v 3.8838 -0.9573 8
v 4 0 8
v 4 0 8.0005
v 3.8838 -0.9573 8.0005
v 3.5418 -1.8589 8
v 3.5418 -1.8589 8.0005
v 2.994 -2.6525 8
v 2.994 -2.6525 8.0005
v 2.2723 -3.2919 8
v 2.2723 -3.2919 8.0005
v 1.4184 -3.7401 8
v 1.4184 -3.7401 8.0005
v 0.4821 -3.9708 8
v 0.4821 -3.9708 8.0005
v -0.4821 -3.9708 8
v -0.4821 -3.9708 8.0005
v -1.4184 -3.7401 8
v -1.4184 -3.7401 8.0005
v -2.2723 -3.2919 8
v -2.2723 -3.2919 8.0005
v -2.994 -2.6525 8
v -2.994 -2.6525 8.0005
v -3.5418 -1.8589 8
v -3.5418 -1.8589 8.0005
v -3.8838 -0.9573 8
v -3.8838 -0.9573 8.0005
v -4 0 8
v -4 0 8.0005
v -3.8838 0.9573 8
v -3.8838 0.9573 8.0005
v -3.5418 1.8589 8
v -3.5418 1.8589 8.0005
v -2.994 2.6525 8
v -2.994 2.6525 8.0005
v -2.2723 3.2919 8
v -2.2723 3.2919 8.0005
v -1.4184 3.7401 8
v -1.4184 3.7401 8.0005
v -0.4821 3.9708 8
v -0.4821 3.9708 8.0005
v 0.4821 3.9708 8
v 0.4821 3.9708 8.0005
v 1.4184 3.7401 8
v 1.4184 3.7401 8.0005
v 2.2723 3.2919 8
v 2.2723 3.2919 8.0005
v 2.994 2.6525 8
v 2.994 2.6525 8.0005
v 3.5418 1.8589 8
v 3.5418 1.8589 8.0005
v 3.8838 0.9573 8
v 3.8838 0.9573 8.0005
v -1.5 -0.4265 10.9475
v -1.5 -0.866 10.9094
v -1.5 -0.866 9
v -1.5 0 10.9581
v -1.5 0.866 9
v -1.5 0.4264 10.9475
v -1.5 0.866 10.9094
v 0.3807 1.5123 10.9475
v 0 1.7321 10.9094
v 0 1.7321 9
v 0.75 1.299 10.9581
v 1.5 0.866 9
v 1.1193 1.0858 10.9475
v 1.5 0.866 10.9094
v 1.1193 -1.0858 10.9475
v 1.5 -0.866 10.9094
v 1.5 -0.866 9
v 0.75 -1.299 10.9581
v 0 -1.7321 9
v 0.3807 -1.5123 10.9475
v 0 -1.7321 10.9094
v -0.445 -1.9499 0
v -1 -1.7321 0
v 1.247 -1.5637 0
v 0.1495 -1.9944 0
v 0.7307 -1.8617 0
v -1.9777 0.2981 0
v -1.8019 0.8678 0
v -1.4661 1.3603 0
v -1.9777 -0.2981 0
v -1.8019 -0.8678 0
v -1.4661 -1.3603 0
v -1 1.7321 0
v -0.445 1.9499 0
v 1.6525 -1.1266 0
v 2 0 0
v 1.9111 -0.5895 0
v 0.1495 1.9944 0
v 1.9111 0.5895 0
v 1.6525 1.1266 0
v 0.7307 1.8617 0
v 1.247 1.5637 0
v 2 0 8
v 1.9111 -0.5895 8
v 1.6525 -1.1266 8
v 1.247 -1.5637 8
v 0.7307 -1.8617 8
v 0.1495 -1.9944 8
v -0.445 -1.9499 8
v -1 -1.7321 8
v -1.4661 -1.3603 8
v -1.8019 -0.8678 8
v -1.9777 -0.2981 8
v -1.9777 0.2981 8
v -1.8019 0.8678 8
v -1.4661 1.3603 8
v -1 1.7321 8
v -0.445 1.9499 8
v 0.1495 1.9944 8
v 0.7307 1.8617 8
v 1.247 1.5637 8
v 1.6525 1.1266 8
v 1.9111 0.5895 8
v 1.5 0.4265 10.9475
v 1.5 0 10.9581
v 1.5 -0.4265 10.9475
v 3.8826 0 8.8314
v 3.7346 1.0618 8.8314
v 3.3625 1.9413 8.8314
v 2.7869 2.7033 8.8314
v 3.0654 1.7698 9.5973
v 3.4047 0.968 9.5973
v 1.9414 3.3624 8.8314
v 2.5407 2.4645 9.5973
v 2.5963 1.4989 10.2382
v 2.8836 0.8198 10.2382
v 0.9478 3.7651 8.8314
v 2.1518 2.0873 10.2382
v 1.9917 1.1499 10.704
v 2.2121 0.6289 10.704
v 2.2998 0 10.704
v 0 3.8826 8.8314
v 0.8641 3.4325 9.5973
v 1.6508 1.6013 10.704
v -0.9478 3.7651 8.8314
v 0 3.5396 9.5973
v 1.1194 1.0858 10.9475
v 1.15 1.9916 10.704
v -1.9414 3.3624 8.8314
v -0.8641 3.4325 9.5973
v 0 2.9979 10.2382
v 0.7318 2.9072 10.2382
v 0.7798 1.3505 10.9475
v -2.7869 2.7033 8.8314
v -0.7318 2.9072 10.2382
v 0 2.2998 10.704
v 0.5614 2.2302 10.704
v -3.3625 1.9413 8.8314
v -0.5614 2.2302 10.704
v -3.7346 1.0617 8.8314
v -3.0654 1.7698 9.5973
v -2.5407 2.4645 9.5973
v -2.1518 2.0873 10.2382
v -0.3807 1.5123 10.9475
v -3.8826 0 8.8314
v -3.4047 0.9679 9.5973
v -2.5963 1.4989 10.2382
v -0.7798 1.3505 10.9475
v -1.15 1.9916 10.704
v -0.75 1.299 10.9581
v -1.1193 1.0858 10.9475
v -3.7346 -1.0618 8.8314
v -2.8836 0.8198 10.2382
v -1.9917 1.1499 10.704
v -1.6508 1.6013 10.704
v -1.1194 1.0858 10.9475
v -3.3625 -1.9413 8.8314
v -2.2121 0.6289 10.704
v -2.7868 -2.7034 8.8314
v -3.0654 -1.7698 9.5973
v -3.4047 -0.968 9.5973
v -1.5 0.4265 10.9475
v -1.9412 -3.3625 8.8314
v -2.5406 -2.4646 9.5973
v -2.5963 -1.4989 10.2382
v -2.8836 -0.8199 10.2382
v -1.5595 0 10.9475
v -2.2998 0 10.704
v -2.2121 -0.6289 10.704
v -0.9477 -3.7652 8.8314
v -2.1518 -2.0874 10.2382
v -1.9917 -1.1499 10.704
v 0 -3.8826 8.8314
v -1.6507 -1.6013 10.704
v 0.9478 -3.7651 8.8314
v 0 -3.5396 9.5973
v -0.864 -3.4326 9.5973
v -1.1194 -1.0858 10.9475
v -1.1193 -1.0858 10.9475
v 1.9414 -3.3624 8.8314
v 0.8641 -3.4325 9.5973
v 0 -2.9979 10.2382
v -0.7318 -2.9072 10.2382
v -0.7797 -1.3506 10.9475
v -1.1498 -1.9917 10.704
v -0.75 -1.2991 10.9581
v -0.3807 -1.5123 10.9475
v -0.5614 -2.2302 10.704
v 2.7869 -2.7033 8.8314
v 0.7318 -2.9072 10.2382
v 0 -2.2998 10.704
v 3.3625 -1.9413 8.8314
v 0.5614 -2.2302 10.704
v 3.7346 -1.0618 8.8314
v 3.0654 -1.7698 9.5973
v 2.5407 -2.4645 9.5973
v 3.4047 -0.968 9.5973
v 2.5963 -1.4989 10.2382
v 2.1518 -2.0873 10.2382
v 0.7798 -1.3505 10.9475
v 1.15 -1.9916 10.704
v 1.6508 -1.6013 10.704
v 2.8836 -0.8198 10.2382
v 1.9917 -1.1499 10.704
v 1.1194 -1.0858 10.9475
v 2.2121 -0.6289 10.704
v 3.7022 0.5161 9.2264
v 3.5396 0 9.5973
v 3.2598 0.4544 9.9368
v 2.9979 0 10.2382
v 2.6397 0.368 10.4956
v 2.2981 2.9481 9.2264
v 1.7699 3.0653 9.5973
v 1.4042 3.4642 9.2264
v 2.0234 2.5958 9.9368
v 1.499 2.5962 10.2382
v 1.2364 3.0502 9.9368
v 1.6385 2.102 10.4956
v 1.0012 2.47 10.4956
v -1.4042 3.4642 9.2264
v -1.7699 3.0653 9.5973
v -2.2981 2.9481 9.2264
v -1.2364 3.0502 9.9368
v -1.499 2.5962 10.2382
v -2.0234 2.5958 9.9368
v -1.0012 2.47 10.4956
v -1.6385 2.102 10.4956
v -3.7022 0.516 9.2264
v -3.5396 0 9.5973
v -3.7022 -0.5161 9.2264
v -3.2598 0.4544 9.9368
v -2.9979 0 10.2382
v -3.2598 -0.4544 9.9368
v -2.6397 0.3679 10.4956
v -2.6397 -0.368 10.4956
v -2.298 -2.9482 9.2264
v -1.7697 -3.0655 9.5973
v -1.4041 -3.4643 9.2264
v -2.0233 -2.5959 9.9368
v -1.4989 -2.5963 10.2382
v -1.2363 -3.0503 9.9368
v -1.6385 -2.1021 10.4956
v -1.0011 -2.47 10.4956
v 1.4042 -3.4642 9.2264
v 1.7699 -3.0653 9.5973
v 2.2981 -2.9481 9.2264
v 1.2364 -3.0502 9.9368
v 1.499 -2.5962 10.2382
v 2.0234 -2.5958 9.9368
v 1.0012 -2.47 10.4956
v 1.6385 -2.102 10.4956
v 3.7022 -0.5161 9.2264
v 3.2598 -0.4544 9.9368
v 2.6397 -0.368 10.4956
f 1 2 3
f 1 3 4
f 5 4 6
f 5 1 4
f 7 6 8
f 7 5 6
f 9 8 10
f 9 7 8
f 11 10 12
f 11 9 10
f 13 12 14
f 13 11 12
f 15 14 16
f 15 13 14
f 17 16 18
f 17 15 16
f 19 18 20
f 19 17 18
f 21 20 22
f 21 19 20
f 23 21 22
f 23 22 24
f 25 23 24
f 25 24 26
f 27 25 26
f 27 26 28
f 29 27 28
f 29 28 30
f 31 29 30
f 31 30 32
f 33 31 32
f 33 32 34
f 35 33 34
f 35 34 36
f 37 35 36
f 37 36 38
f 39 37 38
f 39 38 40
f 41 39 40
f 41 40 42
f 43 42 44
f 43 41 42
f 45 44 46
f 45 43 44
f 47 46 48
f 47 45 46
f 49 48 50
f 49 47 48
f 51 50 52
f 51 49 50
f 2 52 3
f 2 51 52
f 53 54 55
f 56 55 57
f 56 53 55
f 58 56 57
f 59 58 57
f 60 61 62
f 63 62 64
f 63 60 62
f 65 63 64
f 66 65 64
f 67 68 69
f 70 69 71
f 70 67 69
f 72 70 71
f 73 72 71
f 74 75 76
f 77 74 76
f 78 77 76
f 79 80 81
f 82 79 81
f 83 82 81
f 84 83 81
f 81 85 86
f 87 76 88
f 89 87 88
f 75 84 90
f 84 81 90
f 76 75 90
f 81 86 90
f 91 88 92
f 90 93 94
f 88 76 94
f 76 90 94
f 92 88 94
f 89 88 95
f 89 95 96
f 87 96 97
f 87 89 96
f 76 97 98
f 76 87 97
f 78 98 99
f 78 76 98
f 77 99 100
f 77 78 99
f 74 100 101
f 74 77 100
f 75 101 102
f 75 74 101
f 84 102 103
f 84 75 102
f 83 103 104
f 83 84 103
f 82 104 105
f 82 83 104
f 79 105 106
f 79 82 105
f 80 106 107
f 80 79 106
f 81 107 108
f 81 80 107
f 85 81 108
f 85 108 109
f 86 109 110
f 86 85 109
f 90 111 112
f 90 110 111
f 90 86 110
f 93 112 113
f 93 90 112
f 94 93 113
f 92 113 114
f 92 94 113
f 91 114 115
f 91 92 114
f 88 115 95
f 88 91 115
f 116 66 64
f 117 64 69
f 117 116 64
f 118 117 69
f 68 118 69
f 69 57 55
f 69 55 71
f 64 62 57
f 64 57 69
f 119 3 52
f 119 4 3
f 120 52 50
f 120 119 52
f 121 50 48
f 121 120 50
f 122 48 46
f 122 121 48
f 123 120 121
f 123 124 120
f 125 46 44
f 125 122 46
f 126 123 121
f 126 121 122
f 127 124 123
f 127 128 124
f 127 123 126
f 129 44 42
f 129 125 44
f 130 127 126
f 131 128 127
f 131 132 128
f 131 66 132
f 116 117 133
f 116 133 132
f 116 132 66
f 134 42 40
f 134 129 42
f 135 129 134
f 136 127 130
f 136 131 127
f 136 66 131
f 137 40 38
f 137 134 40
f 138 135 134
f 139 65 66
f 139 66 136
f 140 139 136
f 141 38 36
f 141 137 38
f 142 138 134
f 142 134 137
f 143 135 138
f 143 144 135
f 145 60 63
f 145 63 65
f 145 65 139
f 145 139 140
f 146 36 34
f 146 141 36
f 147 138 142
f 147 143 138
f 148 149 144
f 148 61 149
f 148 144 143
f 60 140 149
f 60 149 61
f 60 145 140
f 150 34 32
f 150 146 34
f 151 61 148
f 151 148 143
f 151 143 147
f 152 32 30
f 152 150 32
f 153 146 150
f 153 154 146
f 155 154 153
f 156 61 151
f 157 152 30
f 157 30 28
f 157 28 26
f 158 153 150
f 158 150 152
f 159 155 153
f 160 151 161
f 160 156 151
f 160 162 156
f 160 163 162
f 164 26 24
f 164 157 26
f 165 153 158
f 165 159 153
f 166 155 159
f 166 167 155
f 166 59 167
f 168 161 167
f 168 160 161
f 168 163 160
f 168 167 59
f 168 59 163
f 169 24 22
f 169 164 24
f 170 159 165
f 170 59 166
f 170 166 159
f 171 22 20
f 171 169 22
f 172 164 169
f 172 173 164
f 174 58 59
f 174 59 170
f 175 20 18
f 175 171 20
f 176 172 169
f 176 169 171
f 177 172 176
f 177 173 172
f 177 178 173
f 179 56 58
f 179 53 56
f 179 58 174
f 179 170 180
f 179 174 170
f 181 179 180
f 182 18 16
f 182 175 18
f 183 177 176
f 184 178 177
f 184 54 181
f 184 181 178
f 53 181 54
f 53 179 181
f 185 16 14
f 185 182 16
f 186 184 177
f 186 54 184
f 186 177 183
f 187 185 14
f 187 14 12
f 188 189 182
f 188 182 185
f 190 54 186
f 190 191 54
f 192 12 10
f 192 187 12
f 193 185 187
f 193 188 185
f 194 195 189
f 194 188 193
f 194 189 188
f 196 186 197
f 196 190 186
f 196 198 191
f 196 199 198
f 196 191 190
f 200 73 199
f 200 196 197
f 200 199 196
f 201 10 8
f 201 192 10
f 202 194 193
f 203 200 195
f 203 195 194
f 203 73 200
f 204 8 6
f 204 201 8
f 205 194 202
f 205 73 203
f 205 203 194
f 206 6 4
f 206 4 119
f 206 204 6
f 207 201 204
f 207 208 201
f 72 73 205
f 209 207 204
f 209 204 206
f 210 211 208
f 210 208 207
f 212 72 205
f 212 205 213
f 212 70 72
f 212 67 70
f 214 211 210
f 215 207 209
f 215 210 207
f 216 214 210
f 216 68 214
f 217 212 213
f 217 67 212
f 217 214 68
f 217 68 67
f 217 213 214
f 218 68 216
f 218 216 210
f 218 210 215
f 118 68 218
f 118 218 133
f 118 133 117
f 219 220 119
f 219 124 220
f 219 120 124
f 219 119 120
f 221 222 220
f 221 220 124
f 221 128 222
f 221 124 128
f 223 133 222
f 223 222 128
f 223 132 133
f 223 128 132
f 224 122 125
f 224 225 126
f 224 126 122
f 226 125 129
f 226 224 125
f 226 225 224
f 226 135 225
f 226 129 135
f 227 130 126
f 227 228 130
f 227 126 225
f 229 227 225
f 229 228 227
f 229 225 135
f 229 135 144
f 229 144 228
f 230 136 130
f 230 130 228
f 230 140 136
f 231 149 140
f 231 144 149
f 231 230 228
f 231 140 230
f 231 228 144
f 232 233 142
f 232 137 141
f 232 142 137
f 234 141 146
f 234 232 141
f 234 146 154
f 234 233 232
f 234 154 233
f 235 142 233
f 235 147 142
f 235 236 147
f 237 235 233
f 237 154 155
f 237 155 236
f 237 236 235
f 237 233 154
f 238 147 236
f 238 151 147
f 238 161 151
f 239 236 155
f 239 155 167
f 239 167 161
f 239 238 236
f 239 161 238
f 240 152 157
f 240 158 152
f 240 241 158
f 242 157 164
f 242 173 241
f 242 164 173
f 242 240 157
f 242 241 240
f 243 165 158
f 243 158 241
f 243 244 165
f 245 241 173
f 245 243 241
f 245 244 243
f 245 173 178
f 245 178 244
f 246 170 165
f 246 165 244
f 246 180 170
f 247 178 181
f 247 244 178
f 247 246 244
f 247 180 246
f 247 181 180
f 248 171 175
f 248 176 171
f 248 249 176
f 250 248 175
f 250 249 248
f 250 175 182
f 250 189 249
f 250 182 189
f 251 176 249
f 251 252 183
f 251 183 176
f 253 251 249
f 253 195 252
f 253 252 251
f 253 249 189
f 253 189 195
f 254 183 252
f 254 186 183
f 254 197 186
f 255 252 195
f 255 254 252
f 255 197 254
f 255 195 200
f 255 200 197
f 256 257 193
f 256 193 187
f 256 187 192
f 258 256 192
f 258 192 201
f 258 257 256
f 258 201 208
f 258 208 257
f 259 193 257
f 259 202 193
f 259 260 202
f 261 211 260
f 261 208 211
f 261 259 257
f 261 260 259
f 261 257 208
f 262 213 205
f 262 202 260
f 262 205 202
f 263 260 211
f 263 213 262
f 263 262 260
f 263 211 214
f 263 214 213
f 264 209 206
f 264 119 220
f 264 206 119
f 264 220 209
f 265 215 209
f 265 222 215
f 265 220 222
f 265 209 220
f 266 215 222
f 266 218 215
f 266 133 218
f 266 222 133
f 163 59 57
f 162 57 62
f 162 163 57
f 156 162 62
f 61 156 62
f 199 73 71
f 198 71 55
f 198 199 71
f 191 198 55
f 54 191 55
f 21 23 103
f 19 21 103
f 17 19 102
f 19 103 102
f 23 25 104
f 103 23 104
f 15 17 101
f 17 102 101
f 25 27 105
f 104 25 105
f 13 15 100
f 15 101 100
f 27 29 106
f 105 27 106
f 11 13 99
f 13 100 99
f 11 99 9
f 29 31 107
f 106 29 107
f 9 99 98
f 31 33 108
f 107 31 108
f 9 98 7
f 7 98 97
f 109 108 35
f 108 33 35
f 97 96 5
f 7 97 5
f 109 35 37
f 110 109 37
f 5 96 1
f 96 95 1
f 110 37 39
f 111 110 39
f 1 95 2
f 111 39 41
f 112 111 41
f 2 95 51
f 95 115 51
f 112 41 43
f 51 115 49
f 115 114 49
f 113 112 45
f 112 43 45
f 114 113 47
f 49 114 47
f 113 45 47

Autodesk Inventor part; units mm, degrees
ref_plane "YZ Plane" through (0, 0, 0) normal (1, 0, 0) x (0, 1, 0)
ref_plane "XZ Plane" through (0, 0, 0) normal (0, 1, 0) x (-1, 0, 0)
ref_plane "XY Plane" through (0, 0, 0) normal (0, 0, 1) x (1, 0, 0)
sketch "スケッチ1" plane through (0, 0, 0) normal (0, 0, 1) x (1, 0, 0)
  circle A0 centre (0, 0) radius 2
  dimension "d0" = 4
extrude "押し出し1" add sketch "スケッチ1" along normal blind 8
sketch "スケッチ2" plane through (0, 0, 8) normal (0, 0, 1) x (1, 0, 0)
  circle A0 centre (0, 0) radius 2 projected
  circle A1 centre (0, 0) radius 4
  dimension "d3" = 8
extrude "押し出し2" add sketch "スケッチ2" along normal blind 3 contours A0 | A1
fillet "フィレット1" radius 3 1 edges at (-4, 0, 11)
thread "ねじ1" size "M4x0.7" class "6g" standard "ANSI Metric M Profile" full length
sketch "スケッチ3" plane through (0, 0, 11) normal (0, 0, 1) x (1, 0, 0)
  line L0 (-1.5, 0.866) -> (0, 1.7321)
  line L1 (0, 1.7321) -> (1.5, 0.866)
  line L2 (1.5, 0.866) -> (1.5, -0.866)
  line L3 (1.5, -0.866) -> (0, -1.7321)
  line L4 (0, -1.7321) -> (-1.5, -0.866)
  line L5 (-1.5, -0.866) -> (-1.5, 0.866)
  point P0 (0, 0)
  point P1 (0, 0)
  point P2 (-1.5, 0)
  dimension "d9" = 3
extrude "押し出し3" cut sketch "スケッチ3" against normal blind 2
properties part number "SB　M4 8mm なべネジ" material "Stainless Steel, 440C"
